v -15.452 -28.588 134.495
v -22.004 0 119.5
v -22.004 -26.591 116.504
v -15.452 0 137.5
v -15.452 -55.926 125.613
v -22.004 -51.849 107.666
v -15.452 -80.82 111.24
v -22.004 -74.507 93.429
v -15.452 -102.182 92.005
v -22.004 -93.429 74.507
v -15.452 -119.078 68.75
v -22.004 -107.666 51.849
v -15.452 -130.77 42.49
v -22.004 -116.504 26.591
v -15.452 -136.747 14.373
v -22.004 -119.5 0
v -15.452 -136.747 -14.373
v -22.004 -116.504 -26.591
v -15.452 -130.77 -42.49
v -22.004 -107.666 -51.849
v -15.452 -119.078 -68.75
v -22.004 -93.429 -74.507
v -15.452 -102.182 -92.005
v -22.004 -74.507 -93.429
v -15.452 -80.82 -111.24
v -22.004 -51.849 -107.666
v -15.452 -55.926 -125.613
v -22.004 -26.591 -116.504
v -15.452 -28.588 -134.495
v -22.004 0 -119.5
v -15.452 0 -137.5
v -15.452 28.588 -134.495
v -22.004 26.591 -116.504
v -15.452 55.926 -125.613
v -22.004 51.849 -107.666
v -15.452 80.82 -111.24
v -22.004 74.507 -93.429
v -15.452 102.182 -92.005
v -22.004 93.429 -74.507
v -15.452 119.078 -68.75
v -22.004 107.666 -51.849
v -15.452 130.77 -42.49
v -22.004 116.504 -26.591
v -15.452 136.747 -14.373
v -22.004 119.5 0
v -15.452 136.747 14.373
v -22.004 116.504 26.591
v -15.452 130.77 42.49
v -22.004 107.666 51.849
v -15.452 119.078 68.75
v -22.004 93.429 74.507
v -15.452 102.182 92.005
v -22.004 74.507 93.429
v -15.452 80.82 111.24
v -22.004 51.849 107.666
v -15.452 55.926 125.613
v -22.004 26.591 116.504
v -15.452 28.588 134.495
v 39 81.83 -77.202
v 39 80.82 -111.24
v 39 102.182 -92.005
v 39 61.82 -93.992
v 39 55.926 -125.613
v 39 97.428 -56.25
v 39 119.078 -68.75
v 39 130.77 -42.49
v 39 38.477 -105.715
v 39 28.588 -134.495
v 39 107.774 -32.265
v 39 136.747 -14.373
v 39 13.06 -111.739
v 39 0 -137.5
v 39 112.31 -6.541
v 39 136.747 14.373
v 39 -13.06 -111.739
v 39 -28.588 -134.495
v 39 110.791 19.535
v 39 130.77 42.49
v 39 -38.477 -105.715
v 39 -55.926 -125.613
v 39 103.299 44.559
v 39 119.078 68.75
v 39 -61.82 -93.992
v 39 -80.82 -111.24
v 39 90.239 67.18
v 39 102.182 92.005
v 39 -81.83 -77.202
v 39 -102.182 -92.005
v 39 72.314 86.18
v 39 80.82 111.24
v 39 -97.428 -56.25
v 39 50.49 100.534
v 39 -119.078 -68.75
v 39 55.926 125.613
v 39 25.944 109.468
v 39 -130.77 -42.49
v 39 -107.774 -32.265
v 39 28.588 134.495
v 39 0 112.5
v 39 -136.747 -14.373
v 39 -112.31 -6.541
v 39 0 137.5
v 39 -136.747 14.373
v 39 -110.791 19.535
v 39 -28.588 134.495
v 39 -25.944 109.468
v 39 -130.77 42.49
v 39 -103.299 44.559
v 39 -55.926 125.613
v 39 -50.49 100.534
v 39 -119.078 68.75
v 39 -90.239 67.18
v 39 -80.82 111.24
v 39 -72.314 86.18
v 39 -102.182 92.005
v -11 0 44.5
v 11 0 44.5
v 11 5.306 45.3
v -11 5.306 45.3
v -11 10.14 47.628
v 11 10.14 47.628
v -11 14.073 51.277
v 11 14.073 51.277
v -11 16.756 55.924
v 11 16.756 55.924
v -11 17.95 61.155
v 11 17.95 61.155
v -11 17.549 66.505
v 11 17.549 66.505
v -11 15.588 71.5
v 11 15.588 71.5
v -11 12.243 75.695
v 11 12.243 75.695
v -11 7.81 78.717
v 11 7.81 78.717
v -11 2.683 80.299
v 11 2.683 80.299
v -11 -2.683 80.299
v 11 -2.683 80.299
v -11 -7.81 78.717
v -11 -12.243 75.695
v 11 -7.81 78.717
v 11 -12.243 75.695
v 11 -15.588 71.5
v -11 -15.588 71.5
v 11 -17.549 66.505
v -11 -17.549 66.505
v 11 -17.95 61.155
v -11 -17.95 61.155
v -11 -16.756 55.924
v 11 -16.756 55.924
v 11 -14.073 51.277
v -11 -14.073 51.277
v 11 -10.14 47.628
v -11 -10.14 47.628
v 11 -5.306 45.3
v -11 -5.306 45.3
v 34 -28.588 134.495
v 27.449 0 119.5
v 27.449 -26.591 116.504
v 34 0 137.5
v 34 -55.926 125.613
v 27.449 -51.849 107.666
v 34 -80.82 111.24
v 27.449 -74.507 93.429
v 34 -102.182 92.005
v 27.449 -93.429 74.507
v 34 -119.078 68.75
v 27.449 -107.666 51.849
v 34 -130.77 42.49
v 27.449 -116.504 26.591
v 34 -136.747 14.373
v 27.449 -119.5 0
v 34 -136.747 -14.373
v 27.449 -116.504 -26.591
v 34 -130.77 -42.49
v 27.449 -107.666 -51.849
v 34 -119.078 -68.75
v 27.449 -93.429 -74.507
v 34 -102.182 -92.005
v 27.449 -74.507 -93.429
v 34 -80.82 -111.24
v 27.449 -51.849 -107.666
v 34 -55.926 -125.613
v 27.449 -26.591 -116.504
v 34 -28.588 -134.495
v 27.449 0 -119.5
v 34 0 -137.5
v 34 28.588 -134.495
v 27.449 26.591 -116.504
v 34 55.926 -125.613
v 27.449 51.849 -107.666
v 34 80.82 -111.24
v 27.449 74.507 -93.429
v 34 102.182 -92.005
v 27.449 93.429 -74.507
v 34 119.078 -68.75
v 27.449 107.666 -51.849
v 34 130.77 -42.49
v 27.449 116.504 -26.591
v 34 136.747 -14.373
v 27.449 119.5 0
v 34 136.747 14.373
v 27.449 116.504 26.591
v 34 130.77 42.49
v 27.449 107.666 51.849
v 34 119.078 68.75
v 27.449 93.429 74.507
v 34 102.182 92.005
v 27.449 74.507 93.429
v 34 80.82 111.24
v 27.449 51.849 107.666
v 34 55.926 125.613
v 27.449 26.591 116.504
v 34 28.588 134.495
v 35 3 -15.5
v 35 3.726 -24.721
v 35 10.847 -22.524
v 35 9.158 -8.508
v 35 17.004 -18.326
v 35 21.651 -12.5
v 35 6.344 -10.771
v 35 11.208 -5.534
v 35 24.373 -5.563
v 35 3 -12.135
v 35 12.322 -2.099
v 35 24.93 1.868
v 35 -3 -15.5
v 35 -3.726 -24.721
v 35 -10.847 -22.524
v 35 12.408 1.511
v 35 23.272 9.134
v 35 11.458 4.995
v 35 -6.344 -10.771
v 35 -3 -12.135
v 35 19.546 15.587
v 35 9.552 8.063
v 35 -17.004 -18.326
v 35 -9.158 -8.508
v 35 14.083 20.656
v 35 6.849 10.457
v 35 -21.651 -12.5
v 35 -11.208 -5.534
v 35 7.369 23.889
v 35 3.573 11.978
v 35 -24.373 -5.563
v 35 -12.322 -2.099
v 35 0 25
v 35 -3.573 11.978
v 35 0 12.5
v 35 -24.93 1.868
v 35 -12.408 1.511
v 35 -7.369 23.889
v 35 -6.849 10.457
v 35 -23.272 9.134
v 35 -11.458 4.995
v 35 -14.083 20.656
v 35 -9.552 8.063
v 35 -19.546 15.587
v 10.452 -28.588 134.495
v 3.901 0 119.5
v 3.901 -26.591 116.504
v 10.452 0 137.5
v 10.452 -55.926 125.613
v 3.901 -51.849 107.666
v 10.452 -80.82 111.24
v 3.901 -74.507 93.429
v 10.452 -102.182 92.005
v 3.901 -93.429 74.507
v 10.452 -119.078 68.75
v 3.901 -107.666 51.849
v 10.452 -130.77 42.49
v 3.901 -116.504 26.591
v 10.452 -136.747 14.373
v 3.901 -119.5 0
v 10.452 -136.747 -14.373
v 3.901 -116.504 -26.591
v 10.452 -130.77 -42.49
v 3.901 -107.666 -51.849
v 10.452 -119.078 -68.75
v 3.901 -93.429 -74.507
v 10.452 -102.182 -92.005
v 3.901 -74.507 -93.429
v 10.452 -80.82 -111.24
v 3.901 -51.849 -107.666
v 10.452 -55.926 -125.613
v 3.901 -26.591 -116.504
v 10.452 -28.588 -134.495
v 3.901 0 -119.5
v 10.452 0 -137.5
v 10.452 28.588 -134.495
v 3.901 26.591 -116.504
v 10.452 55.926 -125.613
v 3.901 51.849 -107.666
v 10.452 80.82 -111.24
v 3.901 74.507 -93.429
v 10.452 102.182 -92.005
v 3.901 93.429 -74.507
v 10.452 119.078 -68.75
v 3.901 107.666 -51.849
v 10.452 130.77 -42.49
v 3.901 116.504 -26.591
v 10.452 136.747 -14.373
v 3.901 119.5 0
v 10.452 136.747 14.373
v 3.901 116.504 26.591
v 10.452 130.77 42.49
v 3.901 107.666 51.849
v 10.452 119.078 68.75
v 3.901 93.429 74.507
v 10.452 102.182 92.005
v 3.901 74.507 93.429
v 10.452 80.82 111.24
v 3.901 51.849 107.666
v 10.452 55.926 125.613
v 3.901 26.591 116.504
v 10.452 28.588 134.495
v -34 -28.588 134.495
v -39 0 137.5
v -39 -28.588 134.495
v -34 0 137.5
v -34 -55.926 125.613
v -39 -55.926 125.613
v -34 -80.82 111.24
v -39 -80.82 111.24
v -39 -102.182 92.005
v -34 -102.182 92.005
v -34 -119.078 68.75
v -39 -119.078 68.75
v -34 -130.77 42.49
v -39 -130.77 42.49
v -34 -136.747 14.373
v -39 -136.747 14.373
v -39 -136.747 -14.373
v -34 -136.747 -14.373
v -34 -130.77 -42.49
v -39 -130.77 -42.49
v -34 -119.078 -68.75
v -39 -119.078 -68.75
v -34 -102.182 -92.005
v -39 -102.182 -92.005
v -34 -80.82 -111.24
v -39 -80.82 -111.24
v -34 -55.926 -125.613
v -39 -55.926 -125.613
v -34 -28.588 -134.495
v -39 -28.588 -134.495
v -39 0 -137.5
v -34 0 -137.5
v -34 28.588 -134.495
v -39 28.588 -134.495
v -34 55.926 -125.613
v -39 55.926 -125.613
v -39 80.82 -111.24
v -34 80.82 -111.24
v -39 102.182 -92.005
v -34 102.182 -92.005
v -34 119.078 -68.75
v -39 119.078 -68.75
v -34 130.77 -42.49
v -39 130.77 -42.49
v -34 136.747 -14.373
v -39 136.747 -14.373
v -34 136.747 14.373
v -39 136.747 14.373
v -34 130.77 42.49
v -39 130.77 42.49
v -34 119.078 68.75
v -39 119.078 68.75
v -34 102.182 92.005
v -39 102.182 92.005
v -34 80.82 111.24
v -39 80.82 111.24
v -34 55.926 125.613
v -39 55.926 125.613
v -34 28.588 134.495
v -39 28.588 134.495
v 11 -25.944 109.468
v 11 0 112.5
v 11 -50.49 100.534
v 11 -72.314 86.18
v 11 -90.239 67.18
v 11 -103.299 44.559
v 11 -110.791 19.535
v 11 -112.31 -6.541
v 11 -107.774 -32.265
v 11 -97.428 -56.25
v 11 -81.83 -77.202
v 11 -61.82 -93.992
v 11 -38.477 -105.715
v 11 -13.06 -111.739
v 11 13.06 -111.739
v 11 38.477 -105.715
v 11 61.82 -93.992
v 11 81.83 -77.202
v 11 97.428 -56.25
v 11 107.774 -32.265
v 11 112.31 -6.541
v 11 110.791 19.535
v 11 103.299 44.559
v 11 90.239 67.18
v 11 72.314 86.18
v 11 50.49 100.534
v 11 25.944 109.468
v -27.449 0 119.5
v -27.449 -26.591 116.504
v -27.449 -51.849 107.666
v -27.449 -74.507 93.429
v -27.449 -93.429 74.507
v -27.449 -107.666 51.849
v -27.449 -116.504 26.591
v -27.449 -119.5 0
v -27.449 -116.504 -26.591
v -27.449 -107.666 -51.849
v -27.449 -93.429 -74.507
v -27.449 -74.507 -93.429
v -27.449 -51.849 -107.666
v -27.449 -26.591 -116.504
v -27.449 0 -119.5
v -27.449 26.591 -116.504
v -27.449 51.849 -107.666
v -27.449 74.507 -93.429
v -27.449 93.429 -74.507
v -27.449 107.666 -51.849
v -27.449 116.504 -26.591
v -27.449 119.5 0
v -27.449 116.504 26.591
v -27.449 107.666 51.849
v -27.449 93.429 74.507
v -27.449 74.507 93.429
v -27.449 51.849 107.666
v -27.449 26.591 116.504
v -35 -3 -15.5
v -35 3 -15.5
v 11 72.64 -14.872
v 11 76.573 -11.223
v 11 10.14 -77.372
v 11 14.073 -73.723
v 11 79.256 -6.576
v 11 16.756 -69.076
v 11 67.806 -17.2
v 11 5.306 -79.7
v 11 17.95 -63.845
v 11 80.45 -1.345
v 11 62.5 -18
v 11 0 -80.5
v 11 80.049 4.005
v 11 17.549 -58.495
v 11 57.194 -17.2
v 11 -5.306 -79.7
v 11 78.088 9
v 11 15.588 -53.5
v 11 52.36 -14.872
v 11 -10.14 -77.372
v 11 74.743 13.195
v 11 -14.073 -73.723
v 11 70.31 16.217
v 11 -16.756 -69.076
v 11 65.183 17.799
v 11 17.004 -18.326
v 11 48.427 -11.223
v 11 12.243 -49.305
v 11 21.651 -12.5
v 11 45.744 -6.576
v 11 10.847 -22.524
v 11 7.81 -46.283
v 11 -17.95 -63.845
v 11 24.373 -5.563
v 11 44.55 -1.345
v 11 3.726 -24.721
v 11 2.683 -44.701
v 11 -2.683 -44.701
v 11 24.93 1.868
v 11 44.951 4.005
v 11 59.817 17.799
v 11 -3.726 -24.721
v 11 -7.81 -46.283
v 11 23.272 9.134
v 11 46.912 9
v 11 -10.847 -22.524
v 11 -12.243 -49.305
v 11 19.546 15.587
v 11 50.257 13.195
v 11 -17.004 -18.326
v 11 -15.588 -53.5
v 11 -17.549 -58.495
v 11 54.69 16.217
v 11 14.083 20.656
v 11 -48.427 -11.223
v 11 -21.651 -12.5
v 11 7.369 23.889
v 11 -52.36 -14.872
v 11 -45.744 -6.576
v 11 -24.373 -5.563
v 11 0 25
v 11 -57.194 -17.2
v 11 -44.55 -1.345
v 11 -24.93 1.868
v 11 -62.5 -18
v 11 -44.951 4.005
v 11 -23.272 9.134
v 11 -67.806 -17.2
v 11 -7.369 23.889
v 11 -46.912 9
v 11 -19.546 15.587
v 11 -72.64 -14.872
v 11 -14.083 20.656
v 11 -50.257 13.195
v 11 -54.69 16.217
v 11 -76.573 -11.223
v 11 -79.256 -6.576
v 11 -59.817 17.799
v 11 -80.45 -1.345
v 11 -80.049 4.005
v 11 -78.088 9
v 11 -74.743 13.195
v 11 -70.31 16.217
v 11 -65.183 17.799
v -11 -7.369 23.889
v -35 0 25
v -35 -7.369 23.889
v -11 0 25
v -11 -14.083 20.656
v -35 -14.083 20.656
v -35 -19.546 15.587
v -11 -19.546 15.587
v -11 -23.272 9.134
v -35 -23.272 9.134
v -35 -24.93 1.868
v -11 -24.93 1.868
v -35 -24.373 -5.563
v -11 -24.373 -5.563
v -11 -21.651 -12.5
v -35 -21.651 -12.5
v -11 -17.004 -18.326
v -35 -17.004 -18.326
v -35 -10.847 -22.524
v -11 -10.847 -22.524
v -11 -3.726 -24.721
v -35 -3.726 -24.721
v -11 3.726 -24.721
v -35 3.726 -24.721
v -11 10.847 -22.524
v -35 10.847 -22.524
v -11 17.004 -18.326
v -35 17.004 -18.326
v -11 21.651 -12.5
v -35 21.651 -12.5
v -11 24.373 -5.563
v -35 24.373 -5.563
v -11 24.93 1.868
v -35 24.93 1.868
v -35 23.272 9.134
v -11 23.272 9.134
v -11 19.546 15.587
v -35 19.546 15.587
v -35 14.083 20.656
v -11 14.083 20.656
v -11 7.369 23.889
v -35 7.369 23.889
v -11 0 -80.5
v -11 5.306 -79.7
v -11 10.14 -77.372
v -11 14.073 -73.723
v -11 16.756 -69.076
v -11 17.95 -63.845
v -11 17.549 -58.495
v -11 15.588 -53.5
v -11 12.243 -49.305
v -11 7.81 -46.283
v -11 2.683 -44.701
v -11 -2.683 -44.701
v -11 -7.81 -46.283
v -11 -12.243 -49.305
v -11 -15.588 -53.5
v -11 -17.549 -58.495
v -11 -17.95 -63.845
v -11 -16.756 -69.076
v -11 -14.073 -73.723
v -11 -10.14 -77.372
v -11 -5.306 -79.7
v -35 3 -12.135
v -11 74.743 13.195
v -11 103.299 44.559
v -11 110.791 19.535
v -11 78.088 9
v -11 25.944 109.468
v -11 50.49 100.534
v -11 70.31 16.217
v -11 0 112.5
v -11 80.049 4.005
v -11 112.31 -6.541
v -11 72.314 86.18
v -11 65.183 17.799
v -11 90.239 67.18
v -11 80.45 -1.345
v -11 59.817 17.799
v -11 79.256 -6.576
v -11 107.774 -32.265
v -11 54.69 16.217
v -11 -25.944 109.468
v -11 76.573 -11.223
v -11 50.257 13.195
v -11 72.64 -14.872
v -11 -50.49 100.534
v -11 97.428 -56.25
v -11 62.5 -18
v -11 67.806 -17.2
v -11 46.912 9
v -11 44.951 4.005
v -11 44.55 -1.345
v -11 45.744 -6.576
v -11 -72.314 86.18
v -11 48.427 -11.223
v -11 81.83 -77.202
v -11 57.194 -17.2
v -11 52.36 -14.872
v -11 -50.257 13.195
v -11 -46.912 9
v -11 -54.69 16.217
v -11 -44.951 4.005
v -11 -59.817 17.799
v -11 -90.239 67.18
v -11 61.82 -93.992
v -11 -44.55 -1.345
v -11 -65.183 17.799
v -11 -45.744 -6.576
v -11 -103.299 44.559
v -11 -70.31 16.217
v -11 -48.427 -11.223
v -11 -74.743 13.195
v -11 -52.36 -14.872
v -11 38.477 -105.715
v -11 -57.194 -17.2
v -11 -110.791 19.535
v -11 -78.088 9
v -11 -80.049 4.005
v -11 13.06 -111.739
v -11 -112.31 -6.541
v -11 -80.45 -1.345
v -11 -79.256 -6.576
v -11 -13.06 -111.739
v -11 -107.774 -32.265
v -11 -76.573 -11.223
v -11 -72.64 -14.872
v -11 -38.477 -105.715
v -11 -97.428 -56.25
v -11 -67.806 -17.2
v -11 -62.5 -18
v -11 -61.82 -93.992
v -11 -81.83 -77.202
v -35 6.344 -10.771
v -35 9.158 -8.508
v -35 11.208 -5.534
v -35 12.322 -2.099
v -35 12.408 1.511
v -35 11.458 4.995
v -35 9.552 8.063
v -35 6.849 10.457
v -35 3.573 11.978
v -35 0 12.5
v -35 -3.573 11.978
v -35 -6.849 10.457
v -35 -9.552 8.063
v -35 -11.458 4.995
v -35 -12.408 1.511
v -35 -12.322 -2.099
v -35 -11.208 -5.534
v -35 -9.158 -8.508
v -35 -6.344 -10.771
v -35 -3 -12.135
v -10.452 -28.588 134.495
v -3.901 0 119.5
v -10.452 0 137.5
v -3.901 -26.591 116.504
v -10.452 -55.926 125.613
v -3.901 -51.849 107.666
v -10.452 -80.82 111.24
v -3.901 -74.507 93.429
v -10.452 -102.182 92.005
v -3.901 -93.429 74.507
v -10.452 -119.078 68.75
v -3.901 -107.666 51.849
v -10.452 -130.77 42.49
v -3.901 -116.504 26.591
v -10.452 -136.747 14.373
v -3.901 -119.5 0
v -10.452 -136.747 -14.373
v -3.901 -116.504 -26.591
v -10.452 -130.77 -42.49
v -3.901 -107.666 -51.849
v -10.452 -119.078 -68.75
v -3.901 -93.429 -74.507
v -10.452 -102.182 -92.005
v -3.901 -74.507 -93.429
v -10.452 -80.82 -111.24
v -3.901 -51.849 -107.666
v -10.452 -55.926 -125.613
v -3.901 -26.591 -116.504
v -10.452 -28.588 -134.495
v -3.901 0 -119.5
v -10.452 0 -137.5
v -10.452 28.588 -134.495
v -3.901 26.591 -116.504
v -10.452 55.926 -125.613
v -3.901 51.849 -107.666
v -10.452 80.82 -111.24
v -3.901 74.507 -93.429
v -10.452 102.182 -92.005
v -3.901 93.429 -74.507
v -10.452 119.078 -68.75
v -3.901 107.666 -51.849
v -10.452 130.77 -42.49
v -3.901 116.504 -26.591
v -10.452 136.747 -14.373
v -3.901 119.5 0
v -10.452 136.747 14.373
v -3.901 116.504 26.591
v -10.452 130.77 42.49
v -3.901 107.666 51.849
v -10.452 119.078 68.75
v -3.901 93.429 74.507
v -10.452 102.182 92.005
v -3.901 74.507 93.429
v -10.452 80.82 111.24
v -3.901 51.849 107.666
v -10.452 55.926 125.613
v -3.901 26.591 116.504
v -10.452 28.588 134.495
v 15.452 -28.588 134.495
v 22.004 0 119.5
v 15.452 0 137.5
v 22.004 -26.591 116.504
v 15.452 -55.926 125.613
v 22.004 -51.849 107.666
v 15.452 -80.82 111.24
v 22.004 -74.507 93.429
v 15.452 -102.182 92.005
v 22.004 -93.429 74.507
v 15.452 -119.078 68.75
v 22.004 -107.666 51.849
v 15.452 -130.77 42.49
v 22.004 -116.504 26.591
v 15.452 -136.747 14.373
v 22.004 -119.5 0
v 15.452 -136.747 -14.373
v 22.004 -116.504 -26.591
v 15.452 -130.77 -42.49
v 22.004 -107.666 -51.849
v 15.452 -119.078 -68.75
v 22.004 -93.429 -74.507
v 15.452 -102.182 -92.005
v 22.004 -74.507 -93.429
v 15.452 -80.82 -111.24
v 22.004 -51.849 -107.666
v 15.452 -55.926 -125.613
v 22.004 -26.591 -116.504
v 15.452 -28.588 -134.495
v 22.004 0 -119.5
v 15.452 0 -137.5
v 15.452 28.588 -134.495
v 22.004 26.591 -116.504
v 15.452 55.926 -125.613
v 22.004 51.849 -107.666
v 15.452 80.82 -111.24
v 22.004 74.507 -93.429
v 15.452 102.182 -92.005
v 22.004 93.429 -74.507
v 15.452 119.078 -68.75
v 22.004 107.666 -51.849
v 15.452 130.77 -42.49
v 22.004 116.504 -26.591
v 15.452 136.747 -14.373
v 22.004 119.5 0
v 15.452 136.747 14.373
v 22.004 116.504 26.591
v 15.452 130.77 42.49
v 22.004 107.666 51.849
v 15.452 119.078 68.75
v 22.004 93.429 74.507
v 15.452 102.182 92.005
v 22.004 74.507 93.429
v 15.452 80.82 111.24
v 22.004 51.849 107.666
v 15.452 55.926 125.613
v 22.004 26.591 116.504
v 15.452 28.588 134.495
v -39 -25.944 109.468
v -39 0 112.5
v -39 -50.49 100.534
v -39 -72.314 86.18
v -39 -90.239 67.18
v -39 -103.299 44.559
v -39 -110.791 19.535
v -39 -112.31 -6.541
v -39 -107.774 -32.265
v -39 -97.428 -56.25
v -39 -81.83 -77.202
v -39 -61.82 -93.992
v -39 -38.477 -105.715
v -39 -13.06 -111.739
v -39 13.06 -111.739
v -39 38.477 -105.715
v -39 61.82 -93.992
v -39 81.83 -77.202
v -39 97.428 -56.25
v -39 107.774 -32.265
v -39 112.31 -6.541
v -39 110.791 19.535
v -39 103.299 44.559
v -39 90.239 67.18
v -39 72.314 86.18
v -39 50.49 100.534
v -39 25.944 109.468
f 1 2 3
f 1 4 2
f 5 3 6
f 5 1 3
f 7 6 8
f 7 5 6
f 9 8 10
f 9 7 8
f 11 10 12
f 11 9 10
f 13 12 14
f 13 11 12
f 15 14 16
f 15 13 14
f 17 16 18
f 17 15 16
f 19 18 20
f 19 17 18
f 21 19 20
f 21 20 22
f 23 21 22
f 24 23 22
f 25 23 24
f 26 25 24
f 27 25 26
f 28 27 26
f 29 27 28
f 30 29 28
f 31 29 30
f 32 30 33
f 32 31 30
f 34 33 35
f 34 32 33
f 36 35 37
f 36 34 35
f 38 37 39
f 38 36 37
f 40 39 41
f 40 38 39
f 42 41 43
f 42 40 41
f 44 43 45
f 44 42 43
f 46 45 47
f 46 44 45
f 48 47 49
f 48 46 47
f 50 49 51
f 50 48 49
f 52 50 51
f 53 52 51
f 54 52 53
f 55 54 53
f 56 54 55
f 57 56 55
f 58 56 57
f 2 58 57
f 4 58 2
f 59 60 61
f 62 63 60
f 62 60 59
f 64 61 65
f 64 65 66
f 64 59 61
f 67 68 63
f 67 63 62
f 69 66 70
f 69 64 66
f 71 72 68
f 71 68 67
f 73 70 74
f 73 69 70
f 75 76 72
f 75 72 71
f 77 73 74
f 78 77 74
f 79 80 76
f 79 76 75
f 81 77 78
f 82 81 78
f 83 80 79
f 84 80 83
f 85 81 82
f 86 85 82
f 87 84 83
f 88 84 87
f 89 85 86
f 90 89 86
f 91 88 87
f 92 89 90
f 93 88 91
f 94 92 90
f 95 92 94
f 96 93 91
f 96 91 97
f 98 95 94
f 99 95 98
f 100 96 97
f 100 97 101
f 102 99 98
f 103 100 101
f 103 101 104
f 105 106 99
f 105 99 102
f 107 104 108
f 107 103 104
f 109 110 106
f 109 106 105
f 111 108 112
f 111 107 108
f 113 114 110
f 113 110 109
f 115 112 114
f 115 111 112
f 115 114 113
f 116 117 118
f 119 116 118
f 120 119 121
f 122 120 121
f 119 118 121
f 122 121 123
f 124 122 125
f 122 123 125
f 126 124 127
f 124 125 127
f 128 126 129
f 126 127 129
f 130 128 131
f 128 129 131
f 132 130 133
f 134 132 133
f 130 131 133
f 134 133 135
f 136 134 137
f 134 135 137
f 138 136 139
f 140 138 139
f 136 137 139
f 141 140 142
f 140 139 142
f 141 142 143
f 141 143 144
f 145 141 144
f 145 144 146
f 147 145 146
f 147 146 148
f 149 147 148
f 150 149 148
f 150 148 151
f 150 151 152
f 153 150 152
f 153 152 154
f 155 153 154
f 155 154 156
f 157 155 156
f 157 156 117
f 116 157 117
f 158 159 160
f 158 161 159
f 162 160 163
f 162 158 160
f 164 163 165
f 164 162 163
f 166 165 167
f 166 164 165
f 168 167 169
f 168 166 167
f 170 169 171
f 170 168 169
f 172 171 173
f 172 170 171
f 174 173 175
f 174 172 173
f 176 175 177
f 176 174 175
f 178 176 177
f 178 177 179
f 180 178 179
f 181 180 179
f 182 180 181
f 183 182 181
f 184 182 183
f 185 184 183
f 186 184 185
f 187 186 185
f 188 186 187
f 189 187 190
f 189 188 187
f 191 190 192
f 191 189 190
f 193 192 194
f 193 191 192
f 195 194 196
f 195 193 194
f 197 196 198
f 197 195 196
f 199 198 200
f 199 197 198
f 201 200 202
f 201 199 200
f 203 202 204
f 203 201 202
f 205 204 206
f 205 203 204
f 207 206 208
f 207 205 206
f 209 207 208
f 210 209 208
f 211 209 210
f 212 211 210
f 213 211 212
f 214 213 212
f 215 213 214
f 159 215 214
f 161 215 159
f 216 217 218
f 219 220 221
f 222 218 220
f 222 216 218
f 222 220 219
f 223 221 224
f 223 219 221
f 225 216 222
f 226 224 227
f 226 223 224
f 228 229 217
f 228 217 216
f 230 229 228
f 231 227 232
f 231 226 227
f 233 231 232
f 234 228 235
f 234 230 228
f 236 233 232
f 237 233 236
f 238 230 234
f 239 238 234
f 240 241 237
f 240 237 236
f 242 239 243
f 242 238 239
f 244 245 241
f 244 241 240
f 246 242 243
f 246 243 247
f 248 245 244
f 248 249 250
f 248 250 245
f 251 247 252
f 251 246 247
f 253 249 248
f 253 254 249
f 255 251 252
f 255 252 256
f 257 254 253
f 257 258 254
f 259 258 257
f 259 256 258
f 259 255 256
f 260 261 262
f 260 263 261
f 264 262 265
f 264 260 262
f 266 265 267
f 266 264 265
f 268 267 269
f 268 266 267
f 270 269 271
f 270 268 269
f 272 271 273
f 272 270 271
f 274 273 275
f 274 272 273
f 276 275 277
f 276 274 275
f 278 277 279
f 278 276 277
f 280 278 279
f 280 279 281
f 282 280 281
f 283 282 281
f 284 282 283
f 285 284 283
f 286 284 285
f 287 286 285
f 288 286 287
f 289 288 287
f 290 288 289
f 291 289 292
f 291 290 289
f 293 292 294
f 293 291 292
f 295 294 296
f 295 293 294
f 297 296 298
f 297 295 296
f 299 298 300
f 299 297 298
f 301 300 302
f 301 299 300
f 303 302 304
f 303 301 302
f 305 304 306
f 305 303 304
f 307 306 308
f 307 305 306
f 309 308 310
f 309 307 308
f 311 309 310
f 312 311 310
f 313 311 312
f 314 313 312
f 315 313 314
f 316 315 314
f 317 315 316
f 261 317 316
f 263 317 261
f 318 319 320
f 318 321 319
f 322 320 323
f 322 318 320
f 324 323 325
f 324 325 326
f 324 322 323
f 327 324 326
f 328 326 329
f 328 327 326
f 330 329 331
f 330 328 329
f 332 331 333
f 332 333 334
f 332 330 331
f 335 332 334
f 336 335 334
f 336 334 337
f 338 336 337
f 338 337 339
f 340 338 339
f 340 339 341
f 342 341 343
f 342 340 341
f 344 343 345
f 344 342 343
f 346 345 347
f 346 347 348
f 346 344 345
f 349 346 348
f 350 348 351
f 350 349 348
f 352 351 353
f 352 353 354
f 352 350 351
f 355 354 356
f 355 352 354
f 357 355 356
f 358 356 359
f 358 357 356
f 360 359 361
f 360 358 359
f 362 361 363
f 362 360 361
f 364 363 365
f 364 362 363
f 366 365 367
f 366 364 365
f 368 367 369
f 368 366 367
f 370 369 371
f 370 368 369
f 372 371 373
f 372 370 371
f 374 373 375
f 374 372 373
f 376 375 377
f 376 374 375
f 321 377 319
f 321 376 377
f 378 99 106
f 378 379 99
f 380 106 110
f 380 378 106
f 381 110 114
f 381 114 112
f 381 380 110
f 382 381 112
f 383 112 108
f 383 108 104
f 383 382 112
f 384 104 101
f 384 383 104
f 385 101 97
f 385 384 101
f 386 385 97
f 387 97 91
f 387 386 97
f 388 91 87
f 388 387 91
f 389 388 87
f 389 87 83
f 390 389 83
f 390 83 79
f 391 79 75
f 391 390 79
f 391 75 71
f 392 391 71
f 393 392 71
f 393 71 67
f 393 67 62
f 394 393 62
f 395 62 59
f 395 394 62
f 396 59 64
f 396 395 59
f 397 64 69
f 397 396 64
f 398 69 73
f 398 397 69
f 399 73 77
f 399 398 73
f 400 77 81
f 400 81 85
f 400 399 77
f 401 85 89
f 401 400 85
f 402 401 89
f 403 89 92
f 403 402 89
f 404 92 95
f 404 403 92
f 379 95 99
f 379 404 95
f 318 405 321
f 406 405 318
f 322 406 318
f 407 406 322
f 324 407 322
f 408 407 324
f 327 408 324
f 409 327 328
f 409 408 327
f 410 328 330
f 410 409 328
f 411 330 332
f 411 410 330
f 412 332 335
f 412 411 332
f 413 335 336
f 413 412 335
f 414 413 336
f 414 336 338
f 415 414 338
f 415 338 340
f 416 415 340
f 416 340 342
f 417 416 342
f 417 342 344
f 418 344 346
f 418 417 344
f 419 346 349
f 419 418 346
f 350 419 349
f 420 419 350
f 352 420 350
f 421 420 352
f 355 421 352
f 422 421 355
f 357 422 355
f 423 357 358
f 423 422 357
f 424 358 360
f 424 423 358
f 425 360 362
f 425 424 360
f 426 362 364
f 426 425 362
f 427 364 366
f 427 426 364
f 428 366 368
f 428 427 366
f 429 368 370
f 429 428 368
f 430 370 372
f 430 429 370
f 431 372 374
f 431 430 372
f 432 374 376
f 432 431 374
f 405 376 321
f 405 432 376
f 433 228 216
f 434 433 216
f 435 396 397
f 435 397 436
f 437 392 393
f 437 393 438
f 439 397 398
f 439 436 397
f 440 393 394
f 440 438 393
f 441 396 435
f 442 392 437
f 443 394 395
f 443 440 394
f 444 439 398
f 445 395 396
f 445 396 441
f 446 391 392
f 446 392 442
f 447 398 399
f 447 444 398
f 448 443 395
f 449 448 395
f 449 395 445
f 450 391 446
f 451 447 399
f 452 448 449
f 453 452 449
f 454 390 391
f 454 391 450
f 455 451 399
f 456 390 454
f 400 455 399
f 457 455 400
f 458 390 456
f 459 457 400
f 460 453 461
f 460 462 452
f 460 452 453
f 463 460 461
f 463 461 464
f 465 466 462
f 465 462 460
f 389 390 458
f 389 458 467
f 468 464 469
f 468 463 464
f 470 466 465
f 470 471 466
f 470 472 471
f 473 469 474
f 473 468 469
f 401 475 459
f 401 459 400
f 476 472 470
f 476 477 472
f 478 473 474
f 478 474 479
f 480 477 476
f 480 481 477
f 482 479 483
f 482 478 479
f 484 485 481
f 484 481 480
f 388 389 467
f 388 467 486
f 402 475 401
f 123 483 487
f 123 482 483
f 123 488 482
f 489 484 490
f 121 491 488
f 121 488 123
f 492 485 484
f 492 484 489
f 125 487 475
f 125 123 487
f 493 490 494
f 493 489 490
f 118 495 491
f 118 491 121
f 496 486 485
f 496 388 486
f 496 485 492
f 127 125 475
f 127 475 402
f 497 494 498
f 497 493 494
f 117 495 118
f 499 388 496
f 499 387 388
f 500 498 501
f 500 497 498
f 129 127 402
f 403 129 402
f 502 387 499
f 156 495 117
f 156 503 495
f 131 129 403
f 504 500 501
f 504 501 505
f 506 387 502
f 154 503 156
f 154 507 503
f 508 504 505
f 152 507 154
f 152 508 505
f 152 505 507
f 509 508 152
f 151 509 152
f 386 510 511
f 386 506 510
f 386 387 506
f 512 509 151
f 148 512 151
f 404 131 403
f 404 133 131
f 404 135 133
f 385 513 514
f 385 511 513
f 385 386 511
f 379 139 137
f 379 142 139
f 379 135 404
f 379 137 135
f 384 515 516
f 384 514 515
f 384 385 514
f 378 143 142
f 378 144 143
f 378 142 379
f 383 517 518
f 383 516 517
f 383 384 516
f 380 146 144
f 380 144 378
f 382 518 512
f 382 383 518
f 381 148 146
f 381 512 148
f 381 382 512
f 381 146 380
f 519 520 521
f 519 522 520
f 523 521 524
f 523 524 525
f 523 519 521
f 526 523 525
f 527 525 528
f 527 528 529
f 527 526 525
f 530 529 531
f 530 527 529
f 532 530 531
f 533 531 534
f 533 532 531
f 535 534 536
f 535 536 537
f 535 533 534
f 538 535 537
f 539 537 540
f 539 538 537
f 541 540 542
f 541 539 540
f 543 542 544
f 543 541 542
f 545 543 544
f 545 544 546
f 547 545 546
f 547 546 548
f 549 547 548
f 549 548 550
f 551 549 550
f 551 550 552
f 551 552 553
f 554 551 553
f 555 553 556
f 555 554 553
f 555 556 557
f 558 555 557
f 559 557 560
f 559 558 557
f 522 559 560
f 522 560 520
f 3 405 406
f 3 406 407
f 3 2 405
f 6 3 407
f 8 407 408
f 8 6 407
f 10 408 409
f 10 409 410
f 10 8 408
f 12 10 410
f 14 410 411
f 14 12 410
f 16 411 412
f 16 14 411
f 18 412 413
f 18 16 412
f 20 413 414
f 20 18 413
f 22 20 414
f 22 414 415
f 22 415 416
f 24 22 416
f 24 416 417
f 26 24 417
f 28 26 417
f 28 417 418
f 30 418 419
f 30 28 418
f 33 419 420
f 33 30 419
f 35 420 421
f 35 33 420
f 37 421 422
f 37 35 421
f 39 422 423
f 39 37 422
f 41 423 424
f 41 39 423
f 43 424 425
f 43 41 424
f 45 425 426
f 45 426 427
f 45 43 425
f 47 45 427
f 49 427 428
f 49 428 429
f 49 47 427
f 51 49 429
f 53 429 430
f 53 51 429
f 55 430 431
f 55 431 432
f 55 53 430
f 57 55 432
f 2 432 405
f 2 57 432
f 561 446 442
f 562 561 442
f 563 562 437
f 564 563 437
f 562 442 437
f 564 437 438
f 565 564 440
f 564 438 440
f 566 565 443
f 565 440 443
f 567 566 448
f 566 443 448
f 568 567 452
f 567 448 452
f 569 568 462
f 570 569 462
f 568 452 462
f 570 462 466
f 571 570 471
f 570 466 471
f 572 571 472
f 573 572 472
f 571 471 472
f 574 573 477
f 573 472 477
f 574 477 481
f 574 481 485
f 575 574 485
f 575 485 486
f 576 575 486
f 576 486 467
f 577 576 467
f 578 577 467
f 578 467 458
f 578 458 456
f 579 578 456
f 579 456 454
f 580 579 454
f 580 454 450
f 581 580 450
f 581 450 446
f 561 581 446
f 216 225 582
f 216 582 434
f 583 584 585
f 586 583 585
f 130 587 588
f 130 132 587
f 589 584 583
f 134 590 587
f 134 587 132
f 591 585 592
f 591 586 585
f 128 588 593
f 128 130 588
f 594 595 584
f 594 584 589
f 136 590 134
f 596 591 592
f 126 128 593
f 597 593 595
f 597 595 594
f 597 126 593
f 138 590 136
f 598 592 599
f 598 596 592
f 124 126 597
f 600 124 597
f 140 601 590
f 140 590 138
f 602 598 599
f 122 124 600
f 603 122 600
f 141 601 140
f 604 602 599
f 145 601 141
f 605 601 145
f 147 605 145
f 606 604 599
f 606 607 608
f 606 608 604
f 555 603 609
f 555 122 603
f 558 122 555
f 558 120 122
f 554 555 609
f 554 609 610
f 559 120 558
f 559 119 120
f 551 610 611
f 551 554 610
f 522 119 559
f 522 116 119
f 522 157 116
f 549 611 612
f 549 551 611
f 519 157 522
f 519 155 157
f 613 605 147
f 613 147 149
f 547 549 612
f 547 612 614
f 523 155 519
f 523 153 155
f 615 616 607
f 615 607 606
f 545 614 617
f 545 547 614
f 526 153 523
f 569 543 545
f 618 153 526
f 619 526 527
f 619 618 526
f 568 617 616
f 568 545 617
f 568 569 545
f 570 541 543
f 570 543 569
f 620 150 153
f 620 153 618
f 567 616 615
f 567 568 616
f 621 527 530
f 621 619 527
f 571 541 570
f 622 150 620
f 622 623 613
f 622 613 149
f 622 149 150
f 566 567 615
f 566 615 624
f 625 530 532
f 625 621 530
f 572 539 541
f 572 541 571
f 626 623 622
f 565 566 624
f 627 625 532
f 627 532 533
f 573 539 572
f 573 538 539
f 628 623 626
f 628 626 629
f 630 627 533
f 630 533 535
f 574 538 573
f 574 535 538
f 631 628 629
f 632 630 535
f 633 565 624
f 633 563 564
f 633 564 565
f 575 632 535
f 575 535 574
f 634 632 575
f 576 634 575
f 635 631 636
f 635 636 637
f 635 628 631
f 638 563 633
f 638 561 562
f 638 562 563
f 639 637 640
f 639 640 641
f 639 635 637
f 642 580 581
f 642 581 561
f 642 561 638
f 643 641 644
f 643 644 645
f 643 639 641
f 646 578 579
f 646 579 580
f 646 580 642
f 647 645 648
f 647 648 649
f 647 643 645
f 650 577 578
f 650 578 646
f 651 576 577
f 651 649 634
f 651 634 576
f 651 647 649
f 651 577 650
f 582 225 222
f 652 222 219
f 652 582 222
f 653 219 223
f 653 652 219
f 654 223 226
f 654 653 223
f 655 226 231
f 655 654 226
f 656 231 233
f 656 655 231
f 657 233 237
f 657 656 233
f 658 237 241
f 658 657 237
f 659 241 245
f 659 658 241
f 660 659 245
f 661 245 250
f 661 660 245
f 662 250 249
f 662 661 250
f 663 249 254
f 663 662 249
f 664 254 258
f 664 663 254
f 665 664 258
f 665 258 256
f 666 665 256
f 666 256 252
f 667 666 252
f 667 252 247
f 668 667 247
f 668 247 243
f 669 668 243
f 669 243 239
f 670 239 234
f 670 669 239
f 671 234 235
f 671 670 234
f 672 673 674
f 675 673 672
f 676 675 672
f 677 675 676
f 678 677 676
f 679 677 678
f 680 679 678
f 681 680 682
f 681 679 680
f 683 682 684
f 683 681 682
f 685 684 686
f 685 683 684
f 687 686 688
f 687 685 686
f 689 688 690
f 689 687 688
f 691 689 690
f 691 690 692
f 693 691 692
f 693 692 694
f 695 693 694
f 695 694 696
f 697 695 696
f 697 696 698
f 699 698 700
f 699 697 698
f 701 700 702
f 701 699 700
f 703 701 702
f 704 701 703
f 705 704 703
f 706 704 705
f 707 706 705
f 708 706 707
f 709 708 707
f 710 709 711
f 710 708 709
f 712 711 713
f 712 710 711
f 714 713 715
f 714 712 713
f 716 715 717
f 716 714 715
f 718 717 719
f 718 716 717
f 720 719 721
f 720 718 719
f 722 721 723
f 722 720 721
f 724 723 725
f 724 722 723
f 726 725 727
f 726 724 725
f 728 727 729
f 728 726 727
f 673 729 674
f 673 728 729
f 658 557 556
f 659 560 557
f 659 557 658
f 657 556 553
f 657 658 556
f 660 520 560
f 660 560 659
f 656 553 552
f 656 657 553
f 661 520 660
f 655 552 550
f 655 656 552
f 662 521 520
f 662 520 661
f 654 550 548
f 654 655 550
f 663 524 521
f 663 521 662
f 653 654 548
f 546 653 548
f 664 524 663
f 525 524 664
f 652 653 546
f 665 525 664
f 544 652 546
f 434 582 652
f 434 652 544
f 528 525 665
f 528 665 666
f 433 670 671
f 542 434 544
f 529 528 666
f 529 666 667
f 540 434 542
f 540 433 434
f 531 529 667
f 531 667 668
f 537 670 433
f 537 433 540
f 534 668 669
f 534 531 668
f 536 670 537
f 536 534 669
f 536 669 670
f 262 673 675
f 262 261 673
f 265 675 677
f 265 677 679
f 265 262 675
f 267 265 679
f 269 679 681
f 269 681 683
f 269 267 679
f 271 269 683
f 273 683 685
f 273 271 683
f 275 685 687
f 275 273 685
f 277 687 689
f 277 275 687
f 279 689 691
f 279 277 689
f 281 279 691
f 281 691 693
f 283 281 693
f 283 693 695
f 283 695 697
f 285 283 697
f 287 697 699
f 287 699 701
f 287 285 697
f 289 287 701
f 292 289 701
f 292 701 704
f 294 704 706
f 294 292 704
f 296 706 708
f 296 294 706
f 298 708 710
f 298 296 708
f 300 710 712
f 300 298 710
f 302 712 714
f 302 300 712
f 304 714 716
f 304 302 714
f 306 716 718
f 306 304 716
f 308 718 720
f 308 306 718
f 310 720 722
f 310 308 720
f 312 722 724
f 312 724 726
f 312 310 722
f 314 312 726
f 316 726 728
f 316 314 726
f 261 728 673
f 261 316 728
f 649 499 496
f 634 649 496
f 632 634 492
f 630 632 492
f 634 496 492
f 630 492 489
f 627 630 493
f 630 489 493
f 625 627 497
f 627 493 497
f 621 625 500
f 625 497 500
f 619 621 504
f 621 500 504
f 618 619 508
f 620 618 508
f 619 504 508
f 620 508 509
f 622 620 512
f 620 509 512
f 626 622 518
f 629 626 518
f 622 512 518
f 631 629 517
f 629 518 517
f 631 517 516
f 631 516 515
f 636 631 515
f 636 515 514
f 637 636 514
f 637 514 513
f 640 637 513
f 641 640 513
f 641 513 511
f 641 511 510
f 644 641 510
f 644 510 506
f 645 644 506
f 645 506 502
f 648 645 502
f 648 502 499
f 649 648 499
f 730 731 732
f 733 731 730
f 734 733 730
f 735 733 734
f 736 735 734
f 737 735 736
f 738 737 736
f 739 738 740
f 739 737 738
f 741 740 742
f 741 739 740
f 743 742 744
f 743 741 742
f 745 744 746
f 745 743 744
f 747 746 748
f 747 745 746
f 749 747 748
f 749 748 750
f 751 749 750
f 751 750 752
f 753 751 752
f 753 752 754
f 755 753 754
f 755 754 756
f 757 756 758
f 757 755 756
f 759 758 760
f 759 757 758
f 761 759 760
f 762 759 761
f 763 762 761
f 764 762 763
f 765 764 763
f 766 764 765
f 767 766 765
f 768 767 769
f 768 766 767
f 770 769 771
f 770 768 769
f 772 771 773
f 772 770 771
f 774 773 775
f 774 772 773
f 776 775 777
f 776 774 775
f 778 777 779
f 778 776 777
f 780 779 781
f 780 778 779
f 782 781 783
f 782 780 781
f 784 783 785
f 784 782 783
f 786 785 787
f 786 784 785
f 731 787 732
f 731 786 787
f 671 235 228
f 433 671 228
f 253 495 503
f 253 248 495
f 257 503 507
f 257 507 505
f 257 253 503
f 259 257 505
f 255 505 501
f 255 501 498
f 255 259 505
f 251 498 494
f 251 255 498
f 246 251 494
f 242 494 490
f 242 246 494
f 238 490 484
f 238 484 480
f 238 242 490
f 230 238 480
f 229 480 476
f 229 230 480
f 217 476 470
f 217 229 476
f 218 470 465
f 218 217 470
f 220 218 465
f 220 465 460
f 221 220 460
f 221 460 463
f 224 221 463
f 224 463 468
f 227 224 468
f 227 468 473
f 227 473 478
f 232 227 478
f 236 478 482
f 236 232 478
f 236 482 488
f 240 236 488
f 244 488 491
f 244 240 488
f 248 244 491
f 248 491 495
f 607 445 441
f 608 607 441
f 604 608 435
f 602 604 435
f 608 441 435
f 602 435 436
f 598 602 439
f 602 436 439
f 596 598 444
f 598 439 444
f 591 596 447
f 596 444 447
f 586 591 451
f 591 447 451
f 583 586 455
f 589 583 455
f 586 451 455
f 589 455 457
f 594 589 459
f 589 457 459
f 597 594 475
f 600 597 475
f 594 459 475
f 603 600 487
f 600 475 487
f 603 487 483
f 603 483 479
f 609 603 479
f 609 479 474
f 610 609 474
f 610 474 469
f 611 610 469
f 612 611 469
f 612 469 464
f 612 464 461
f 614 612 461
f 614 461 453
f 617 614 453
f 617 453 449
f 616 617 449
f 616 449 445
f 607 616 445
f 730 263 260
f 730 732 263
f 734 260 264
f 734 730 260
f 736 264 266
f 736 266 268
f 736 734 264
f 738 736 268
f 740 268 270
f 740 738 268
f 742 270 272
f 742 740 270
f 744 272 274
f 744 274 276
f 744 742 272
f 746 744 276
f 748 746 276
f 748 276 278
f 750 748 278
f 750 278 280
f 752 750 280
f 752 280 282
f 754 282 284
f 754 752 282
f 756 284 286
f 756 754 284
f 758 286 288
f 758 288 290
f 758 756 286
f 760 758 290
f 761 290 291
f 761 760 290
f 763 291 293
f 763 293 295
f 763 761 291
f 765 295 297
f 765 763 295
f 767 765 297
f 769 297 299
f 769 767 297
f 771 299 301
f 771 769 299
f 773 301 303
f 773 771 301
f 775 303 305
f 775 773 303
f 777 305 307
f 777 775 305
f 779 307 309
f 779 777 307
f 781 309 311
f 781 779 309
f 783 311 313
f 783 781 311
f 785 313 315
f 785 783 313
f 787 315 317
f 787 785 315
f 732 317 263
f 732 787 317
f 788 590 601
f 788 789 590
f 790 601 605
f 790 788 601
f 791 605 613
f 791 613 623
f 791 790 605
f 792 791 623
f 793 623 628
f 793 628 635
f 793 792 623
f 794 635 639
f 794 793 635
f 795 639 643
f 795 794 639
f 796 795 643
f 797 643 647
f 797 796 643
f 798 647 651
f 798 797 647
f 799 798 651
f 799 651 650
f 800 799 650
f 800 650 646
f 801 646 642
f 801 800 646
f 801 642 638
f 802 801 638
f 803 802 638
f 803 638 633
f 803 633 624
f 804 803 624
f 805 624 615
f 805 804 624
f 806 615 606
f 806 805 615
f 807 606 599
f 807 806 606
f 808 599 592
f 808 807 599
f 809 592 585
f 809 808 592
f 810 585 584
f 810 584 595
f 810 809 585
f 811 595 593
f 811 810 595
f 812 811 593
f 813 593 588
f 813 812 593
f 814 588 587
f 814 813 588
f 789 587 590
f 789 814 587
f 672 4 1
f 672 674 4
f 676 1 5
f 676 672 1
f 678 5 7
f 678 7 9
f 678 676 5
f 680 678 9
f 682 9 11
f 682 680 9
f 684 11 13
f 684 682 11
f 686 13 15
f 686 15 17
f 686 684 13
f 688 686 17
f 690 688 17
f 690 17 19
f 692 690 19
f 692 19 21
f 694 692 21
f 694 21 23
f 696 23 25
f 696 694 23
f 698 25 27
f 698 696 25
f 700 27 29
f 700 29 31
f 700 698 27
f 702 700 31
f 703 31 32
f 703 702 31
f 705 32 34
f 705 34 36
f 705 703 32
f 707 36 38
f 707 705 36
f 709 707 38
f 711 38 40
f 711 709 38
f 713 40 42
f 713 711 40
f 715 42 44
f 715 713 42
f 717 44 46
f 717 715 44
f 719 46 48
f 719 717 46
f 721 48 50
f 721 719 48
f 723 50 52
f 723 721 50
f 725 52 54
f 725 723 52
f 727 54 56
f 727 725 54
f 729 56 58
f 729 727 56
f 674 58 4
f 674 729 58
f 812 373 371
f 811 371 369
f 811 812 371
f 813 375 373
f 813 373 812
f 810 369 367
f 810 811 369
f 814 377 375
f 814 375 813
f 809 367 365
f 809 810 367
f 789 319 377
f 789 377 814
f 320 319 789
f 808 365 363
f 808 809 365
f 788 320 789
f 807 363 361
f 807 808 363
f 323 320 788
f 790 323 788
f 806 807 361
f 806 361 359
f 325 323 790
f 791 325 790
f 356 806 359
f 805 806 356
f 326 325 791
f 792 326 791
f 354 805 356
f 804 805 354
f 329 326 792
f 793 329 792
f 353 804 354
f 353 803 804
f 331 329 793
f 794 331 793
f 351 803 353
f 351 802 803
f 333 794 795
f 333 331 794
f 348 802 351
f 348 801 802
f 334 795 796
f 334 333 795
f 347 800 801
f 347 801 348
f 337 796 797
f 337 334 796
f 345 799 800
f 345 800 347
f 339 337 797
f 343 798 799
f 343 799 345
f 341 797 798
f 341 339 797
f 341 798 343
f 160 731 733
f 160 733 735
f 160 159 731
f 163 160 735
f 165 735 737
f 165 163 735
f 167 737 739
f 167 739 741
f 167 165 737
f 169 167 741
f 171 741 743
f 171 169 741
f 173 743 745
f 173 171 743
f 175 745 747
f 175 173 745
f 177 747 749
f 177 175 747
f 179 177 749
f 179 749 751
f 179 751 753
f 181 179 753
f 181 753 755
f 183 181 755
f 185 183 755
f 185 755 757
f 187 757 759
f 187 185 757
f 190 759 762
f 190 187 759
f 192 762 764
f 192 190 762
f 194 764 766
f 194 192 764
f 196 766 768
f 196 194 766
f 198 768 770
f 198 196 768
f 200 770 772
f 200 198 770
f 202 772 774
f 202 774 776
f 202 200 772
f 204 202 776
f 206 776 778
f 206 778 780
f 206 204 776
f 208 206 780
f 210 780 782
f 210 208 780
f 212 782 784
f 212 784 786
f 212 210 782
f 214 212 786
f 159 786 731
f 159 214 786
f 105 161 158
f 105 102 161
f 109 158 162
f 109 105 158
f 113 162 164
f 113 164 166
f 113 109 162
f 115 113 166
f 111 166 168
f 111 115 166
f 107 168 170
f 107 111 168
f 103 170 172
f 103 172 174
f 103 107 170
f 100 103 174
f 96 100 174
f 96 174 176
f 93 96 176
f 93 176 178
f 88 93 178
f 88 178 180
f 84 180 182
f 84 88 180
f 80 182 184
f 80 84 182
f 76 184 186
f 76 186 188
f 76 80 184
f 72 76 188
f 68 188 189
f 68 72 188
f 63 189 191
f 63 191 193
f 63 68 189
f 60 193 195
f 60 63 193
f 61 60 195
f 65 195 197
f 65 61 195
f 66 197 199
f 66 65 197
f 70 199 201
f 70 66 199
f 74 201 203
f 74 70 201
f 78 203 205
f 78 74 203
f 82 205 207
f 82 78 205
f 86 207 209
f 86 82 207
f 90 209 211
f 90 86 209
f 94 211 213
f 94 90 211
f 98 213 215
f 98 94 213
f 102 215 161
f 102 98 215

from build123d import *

# Parameters (mm, degrees)
SKETCH3_W           = 3.5
SKETCH3_H           = 6
CUT_EXTRUDE9_DEPTH  = 209.058885895
SKETCH7_R           = 18
CUT_EXTRUDE10_DEPTH = 201.779730053


with BuildPart() as part:
    # Sketch1 → Revolve5 (revolve)
    with BuildSketch(Plane.XY, mode=Mode.PRIVATE) as revolve5_sk:
        Polygon((10.452306897, 137.5), (15.452306897, 137.5), (22.003771114, 119.5), (27.448535783, 119.5), (34, 137.5), (39, 137.5), (39, 112.5), (11, 112.5), (11, 25), (35, 25), (35, 12.5), (-35, 12.5), (-35, 25), (-11, 25), (-11, 112.5), (-39, 112.5), (-39, 137.5), (-34, 137.5), (-27.448535783, 119.5), (-22.003771114, 119.5), (-15.452306897, 137.5), (-10.452306897, 137.5), (-3.900842681, 119.5), (3.900842681, 119.5), align=None)
    revolve(revolve5_sk.sketch.rotate(Axis((-35, 0, 0), (1, 0, 0)), 90), axis=Axis((-35, 0, 0), (1, 0, 0)))

    # Sketch3 → Cut-Extrude9 (cut, through all)
    with BuildSketch(Plane(origin=(35, 0, 0), x_dir=(0, 0, -1), z_dir=(1, 0, 0))):
        with Locations((13.75, 0)):
            Rectangle(SKETCH3_W, SKETCH3_H)
    extrude(amount=-CUT_EXTRUDE9_DEPTH, mode=Mode.SUBTRACT)

    # Sketch7 → Cut-Extrude10 (cut, through all)
    with BuildSketch(Plane(origin=(11, 0, 0), x_dir=(0, 0, -1), z_dir=(1, 0, 0))):
        with Locations((0, 62.5)):
            Circle(SKETCH7_R)
        with Locations((62.5, 0)):
            Circle(SKETCH7_R)
        with Locations((0, -62.5)):
            Circle(SKETCH7_R)
        with Locations((-62.5, 0)):
            Circle(SKETCH7_R)
    extrude(amount=-CUT_EXTRUDE10_DEPTH, mode=Mode.SUBTRACT)


solid = part.part
